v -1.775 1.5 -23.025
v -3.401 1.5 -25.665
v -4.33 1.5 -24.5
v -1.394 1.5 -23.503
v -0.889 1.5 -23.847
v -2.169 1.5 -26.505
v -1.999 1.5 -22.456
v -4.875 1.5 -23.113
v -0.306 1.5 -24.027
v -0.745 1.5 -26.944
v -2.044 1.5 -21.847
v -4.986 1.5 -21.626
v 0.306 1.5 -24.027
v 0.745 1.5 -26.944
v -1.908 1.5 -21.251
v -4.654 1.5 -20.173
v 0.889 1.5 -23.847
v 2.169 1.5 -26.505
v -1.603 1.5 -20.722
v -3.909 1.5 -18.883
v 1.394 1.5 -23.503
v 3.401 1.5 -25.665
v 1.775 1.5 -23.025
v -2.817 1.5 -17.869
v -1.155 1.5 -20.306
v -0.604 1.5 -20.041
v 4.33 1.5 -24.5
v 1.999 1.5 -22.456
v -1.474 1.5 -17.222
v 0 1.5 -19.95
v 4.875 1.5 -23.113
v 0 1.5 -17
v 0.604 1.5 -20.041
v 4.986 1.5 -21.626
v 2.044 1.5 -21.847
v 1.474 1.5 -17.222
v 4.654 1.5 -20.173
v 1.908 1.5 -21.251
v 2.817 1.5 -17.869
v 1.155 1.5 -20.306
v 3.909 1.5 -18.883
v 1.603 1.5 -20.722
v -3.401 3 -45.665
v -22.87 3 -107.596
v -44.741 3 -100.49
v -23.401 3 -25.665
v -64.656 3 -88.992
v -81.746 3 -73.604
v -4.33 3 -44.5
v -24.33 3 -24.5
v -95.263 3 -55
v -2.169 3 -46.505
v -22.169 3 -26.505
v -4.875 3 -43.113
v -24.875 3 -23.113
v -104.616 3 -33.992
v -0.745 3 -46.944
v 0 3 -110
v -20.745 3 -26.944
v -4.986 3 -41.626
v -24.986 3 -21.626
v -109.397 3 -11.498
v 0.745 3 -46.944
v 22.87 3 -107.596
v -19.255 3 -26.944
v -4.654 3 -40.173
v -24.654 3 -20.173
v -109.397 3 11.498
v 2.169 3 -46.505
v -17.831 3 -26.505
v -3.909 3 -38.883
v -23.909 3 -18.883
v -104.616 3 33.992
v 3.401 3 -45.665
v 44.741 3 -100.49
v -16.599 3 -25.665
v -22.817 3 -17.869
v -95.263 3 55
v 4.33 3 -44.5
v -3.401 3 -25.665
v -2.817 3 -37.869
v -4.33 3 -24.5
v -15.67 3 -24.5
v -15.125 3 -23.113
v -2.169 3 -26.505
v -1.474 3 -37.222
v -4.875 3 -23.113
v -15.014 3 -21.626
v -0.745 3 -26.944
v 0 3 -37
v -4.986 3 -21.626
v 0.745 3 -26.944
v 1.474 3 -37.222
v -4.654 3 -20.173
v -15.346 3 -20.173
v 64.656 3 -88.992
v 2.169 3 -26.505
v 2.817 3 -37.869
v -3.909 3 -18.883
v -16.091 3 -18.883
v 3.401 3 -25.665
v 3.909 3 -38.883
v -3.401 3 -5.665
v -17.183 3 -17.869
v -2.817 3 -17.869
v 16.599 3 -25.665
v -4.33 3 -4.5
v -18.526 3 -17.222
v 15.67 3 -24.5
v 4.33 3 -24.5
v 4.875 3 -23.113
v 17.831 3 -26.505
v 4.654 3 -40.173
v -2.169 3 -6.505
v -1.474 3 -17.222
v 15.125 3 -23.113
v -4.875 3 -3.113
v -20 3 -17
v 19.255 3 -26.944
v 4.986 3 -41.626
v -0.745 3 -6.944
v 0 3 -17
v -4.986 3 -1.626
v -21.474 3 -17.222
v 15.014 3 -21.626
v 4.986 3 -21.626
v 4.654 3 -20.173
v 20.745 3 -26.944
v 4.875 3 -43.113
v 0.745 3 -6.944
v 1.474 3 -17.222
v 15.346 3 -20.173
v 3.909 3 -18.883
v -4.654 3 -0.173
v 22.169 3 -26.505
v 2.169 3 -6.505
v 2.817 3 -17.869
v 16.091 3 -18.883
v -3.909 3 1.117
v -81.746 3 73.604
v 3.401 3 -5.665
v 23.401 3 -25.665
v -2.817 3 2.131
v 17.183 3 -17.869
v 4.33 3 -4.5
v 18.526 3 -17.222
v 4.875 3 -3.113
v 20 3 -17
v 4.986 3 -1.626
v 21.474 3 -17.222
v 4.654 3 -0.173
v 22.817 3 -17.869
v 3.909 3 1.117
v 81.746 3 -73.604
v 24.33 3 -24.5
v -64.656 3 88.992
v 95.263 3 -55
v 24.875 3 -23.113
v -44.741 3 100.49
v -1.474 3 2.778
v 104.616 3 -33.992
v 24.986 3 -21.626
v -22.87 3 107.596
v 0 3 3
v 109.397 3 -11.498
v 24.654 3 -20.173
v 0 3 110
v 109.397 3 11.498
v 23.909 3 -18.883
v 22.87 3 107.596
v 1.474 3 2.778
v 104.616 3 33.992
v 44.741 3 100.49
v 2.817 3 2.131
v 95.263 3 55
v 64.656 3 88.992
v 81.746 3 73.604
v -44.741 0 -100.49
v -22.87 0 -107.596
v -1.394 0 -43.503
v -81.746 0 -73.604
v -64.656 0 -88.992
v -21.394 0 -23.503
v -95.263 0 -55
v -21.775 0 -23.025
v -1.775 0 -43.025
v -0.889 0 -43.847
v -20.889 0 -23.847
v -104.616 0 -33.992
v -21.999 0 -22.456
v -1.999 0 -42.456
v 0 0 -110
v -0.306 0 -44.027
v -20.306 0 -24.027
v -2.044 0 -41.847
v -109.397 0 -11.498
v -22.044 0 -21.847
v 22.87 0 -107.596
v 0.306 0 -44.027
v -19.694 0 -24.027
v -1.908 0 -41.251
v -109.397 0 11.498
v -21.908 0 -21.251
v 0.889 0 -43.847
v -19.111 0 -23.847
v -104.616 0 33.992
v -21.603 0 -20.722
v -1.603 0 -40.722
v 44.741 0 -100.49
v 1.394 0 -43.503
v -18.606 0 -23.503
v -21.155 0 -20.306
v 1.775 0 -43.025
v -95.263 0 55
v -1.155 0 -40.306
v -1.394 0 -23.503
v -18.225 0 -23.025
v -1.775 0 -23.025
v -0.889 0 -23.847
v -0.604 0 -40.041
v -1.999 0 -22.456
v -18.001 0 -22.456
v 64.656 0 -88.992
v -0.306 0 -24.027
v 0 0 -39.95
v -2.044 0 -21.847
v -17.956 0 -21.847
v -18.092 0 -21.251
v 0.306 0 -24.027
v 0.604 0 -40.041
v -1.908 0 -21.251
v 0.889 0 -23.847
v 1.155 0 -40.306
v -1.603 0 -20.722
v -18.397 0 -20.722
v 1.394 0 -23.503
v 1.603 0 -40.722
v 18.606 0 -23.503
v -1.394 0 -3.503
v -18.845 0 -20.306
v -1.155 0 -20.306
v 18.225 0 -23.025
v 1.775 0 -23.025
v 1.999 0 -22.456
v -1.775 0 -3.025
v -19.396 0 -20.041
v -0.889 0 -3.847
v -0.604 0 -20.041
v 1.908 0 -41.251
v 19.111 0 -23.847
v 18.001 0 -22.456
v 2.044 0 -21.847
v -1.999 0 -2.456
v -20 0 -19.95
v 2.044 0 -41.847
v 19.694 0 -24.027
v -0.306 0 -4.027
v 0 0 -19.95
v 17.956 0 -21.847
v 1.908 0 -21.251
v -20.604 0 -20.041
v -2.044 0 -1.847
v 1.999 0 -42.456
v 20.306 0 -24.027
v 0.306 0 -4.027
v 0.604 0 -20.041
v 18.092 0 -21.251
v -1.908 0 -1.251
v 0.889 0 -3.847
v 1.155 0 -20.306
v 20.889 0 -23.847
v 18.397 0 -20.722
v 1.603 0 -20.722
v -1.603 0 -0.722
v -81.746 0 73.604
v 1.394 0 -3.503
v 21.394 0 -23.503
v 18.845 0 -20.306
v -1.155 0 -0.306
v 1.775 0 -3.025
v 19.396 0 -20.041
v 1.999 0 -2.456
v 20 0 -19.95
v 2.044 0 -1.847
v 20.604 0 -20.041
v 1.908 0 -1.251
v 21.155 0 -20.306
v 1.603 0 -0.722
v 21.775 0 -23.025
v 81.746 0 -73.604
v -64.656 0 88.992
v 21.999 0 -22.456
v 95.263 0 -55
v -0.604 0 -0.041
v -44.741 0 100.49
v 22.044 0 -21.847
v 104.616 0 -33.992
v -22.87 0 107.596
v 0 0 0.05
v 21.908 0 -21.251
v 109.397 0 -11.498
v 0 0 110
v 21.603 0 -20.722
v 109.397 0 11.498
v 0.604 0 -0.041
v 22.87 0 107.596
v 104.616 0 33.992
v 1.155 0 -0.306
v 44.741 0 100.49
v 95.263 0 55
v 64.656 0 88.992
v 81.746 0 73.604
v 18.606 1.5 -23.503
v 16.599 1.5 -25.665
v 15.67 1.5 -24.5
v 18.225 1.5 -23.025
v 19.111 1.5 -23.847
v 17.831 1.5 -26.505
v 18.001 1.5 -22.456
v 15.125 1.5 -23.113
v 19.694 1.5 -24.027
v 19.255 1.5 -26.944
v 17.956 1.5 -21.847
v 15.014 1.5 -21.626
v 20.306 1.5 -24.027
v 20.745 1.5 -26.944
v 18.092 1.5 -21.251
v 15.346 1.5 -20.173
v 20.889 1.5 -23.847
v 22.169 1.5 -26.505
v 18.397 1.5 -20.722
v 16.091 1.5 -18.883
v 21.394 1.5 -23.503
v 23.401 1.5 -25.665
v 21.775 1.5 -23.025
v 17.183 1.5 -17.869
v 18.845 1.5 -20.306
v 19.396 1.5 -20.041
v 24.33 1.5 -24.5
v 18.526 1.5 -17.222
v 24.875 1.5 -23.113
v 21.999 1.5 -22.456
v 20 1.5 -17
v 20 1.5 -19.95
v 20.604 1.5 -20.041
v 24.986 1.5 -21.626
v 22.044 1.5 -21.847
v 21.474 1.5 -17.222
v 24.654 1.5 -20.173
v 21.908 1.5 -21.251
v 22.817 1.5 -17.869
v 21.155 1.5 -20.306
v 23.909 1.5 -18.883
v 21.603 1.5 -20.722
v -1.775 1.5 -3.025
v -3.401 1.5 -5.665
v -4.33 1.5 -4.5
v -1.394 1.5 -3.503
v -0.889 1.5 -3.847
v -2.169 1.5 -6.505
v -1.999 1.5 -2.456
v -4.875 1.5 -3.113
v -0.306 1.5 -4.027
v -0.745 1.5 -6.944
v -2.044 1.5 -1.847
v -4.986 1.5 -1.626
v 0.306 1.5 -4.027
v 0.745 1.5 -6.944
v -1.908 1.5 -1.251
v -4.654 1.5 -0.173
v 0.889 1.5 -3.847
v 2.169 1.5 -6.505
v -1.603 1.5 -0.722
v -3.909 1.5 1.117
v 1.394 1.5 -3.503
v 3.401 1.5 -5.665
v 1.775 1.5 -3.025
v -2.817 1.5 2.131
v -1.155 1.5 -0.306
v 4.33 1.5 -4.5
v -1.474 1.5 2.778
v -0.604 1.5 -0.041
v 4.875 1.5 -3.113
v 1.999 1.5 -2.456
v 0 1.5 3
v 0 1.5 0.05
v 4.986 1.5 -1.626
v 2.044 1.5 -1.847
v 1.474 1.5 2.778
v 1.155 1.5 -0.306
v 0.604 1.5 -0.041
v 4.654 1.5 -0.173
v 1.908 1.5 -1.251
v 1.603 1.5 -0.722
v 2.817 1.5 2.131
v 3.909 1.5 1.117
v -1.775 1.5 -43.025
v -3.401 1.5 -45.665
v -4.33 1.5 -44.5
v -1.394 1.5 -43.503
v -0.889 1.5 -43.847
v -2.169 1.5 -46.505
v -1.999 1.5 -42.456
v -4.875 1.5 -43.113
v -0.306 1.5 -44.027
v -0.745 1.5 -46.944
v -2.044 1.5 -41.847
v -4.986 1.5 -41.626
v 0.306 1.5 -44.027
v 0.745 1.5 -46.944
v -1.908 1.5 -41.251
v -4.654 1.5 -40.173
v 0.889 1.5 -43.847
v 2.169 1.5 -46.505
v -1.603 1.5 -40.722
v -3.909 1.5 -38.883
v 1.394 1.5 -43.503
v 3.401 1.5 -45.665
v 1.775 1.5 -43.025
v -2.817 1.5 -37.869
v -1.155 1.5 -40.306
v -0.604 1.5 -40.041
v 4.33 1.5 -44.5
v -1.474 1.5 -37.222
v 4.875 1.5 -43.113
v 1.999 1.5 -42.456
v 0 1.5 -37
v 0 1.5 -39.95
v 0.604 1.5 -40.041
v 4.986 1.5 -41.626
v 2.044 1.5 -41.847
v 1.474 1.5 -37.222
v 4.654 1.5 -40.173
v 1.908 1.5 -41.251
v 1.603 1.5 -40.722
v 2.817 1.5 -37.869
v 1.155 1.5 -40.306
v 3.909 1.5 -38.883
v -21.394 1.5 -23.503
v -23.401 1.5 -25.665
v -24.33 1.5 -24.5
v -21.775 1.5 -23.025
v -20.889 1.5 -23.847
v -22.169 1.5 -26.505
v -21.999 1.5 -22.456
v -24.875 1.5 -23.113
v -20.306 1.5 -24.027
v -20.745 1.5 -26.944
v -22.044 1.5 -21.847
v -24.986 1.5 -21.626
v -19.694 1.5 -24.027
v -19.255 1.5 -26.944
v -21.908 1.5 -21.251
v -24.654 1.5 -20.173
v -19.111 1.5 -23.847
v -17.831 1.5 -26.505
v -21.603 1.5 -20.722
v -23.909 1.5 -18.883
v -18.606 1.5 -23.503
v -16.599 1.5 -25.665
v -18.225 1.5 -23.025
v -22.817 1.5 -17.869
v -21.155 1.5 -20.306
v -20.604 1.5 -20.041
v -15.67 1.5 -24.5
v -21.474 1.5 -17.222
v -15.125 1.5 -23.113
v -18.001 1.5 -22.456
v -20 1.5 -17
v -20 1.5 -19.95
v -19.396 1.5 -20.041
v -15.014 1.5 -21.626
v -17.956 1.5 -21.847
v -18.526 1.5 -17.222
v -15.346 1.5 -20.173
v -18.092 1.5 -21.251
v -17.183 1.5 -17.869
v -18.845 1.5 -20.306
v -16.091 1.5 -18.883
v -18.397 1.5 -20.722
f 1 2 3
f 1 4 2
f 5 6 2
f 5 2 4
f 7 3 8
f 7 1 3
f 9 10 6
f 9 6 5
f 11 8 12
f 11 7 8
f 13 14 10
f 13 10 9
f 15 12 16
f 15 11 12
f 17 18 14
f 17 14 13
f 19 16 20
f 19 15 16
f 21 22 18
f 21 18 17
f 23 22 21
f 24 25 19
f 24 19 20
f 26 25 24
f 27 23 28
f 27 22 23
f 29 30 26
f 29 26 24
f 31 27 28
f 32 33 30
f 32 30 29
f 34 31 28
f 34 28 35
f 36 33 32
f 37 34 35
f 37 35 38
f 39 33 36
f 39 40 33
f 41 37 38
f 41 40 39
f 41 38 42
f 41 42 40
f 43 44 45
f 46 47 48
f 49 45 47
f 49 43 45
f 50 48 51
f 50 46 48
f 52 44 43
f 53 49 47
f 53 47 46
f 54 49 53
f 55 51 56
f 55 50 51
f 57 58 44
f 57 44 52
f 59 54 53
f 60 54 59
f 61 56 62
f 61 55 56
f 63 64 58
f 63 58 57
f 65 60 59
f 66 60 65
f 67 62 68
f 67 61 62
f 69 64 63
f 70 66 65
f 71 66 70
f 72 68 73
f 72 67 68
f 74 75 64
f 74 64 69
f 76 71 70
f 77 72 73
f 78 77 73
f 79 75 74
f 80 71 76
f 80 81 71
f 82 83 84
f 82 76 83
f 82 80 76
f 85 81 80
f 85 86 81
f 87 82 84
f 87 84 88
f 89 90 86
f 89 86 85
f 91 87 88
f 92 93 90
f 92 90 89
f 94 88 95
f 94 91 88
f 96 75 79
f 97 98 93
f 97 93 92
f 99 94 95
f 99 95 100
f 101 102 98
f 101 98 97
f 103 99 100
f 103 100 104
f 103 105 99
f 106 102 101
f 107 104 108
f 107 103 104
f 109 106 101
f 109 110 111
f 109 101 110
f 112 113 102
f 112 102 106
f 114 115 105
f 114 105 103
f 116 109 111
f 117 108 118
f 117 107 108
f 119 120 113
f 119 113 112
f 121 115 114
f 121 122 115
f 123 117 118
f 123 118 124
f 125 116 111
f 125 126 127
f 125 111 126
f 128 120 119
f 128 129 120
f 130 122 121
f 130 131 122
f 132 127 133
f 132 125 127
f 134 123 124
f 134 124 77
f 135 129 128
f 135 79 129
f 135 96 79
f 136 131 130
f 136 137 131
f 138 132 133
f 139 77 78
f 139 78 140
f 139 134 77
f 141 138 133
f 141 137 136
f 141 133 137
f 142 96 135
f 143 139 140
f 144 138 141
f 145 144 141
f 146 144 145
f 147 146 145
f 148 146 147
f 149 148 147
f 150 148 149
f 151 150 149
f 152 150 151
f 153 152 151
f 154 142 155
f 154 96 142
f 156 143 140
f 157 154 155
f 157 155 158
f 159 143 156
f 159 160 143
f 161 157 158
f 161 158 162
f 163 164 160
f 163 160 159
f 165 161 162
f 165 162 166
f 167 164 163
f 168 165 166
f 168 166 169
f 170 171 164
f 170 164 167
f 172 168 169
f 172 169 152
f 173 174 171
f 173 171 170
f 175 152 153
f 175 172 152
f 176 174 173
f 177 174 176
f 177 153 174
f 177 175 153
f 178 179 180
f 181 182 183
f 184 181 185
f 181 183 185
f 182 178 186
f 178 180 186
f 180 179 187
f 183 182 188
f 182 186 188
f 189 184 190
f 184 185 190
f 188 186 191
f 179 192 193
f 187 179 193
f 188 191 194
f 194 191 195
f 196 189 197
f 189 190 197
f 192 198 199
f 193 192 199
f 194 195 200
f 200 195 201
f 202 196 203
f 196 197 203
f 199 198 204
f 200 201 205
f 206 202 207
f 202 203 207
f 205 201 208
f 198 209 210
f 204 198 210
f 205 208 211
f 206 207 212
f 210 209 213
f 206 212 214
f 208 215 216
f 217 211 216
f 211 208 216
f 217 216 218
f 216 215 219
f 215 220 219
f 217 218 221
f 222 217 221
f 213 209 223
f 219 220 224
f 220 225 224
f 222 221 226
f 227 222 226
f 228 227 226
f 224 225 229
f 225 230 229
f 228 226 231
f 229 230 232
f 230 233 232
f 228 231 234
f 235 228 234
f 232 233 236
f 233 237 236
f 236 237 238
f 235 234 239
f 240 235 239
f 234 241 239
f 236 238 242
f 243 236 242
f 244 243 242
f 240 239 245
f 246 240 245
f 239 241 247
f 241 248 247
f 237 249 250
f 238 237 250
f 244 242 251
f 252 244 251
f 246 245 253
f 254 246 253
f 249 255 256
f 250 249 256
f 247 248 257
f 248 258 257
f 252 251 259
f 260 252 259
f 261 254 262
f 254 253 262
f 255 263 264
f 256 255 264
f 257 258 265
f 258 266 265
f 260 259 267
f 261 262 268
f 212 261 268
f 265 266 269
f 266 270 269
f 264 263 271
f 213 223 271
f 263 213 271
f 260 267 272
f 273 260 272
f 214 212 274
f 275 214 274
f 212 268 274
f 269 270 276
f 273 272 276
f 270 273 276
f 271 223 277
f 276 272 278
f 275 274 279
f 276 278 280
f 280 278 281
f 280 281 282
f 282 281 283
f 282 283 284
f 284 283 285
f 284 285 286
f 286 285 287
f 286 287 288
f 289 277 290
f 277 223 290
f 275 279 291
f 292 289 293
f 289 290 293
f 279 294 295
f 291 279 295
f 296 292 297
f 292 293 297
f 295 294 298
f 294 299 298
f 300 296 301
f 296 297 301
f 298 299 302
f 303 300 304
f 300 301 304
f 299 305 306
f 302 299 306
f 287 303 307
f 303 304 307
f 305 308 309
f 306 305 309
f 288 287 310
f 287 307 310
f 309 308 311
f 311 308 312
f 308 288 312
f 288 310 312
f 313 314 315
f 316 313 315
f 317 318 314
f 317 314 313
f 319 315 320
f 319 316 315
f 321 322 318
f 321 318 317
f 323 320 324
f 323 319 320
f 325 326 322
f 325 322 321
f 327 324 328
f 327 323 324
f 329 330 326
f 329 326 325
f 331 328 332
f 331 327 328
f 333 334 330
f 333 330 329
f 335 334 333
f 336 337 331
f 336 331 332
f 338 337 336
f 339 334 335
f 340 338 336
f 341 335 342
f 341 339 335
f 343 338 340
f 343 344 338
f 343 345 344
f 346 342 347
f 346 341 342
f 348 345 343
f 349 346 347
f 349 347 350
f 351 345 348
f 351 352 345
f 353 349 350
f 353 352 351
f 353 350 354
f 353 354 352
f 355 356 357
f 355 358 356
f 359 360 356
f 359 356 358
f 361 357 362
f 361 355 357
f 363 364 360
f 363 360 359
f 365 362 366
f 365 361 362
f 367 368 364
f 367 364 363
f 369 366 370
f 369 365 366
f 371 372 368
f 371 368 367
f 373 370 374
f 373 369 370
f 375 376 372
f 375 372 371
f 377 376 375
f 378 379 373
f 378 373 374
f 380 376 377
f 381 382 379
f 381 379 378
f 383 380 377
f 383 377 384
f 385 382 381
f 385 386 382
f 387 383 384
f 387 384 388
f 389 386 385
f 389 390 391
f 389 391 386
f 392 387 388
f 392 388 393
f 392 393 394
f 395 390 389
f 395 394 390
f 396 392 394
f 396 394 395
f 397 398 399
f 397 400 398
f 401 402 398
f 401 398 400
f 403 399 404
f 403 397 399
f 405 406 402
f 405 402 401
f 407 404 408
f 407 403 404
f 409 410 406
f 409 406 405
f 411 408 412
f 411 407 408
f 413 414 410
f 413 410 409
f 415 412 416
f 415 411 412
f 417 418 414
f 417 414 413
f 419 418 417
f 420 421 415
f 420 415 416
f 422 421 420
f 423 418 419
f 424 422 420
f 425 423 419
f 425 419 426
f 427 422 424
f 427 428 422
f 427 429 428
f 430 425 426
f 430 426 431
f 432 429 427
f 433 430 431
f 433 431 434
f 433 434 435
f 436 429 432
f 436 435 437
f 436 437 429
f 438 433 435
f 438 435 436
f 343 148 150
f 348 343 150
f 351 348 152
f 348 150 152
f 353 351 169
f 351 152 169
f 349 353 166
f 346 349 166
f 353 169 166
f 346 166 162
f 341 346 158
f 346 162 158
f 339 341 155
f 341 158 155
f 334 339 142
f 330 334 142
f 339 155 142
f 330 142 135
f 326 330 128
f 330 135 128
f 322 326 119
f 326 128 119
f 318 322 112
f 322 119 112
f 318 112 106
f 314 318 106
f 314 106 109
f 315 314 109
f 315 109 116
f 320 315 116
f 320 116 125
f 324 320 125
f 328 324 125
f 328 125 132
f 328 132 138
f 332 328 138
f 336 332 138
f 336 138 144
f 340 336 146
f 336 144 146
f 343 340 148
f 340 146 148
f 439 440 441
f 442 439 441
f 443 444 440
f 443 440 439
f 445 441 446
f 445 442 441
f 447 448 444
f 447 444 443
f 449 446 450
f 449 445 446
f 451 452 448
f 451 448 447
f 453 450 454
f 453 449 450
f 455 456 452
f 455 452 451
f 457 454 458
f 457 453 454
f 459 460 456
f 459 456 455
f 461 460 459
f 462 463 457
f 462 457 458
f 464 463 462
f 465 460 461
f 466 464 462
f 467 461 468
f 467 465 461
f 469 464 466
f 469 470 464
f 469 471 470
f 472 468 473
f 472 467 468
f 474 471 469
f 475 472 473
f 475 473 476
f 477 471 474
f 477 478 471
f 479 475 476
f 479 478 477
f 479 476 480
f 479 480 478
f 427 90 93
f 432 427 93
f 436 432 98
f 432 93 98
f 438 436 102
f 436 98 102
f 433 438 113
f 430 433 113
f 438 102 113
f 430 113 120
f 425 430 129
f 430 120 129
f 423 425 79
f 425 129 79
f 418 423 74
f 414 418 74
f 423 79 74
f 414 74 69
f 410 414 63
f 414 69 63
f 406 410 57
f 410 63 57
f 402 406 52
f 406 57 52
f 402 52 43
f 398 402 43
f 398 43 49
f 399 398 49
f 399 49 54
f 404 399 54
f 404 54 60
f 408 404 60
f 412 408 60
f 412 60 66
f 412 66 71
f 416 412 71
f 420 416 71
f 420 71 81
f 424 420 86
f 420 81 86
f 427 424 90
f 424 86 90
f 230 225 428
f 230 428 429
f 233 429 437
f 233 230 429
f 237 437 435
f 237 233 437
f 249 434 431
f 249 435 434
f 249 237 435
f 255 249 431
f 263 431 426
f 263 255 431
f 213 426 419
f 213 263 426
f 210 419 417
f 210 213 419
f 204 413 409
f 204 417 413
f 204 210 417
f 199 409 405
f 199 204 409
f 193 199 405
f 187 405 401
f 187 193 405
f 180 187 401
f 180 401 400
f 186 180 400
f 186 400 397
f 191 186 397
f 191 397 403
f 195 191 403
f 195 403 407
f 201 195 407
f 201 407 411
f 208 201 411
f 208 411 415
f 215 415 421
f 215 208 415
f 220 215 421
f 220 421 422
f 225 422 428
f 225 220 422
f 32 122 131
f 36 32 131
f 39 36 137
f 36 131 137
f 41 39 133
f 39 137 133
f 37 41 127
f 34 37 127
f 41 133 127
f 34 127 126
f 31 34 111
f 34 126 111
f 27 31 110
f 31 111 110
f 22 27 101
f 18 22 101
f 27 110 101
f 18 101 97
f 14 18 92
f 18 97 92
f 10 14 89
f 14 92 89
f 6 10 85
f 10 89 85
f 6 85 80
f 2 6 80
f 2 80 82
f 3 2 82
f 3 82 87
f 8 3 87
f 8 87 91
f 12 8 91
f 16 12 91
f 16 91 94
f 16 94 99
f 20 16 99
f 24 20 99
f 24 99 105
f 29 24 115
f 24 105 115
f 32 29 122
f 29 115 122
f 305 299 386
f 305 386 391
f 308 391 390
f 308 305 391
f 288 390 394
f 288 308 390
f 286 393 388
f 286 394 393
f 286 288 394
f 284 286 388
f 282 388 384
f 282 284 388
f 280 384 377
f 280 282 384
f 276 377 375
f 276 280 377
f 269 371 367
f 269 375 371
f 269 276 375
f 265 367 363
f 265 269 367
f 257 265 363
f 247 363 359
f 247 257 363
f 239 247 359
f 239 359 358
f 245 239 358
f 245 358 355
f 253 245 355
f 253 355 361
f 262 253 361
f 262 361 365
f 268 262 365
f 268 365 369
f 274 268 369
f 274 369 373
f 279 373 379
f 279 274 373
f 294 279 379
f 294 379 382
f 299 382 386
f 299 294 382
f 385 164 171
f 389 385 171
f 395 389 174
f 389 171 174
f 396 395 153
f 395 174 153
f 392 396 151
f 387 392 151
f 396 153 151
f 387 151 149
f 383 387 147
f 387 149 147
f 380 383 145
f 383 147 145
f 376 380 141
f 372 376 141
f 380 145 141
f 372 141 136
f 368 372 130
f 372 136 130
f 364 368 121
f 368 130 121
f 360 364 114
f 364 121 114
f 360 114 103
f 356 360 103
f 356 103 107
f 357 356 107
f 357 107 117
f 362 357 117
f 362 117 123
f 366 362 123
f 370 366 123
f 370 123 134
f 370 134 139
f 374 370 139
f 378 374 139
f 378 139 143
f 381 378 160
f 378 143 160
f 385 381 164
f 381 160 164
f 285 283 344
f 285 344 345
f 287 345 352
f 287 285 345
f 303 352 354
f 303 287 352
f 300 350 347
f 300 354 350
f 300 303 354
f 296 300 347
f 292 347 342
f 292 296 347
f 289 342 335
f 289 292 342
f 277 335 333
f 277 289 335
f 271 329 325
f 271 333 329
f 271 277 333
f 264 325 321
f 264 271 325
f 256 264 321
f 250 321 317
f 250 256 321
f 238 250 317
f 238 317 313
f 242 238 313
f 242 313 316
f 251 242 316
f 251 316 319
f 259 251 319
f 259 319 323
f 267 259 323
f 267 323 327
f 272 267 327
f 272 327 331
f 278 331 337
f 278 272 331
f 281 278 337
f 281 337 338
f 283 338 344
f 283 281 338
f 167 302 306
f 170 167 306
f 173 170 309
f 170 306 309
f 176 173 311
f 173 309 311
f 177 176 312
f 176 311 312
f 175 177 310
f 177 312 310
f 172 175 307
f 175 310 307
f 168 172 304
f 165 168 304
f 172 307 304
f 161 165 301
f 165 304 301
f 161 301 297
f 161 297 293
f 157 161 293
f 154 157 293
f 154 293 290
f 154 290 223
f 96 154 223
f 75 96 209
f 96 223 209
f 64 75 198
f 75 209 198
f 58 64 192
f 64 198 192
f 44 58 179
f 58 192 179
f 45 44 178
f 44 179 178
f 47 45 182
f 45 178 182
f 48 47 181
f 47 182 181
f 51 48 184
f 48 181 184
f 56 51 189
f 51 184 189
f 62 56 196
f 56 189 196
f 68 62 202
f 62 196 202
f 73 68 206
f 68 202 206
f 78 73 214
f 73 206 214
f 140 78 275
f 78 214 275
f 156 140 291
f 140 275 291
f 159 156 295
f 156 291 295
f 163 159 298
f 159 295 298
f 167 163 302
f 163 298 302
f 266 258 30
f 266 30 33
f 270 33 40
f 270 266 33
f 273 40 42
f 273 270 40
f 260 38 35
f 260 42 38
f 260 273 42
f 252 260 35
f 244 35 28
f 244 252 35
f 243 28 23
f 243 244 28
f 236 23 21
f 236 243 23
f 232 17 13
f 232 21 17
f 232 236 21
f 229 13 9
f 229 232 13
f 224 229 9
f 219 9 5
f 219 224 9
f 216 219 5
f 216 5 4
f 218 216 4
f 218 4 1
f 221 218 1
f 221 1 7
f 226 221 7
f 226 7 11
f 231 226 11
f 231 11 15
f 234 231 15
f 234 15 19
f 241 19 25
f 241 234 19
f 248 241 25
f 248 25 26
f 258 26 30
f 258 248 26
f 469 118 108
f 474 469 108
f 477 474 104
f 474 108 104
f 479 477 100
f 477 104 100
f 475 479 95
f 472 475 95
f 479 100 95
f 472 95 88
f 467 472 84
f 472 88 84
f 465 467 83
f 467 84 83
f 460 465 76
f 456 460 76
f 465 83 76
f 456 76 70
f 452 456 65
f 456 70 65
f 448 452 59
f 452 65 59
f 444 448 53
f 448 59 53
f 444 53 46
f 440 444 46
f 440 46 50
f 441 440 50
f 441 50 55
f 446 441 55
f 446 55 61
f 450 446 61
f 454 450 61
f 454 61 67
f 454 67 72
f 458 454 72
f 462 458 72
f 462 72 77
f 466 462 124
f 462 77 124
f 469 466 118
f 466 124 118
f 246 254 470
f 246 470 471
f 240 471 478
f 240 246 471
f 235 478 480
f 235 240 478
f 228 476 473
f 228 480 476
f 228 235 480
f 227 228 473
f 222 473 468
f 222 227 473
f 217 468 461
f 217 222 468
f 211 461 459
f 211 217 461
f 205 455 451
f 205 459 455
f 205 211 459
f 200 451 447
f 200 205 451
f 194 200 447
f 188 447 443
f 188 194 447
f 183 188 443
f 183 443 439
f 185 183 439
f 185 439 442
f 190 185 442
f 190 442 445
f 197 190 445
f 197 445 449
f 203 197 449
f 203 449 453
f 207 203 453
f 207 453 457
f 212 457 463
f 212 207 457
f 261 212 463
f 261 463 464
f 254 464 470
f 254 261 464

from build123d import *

# Parameters (mm, degrees)
SKETCH_1_R               = 110
EXTRUDE_1_DEPTH          = 3
CUT_EXTRUDE_1_DEPTH      = 156.592416268
CUT_EXTRUDE_1_DEPTH_BACK = 156.592416268
SKETCH_2_R               = 2.05
SKETCH_4_R               = 5
CUT_EXTRUDE_2_DEPTH      = 1.5


with BuildPart() as part:
    # 草图1 → 凸台-拉伸1 (new body)
    with BuildSketch(Plane(origin=(0, 0, 0), x_dir=(1, 0, 0), z_dir=(0, 1, 0))):
        with Locations(Location((0, 0, 0), (0, 0, 270))):
            Circle(SKETCH_1_R)
    extrude(amount=EXTRUDE_1_DEPTH)

    # 草图2 → 切除-拉伸1 (cut, two sides: drawn at the far end of the back side and taken through both)
    with BuildSketch(Plane(origin=(0, 3, 0), x_dir=(1, 0, 0), z_dir=(0, 1, 0)).offset(-CUT_EXTRUDE_1_DEPTH_BACK)):
        with Locations(Location((20, 22, 0), (0, 0, 270))):
            Circle(SKETCH_2_R)
        with Locations(Location((0, 22, 0), (0, 0, 270))):
            Circle(SKETCH_2_R)
        with Locations(Location((0, 42, 0), (0, 0, 270))):
            Circle(SKETCH_2_R)
        with Locations(Location((0, 2, 0), (0, 0, 270))):
            Circle(SKETCH_2_R)
        with Locations(Location((-20, 22, 0), (0, 0, 270))):
            Circle(SKETCH_2_R)
    extrude(amount=CUT_EXTRUDE_1_DEPTH + CUT_EXTRUDE_1_DEPTH_BACK, mode=Mode.SUBTRACT)

    # 草图4 → 切除-拉伸2 (cut)
    with BuildSketch(Plane(origin=(0, 3, 0), x_dir=(1, 0, 0), z_dir=(0, 1, 0))):
        with Locations(Location((0, 22, 0), (0, 0, 270))):
            Circle(SKETCH_4_R)
        with Locations(Location((20, 22, 0), (0, 0, 270))):
            Circle(SKETCH_4_R)
        with Locations(Location((0, 42, 0), (0, 0, 270))):
            Circle(SKETCH_4_R)
        with Locations(Location((0, 2, 0), (0, 0, 270))):
            Circle(SKETCH_4_R)
        with Locations(Location((-20, 22, 0), (0, 0, 270))):
            Circle(SKETCH_4_R)
    extrude(amount=-CUT_EXTRUDE_2_DEPTH, mode=Mode.SUBTRACT)


solid = part.part
